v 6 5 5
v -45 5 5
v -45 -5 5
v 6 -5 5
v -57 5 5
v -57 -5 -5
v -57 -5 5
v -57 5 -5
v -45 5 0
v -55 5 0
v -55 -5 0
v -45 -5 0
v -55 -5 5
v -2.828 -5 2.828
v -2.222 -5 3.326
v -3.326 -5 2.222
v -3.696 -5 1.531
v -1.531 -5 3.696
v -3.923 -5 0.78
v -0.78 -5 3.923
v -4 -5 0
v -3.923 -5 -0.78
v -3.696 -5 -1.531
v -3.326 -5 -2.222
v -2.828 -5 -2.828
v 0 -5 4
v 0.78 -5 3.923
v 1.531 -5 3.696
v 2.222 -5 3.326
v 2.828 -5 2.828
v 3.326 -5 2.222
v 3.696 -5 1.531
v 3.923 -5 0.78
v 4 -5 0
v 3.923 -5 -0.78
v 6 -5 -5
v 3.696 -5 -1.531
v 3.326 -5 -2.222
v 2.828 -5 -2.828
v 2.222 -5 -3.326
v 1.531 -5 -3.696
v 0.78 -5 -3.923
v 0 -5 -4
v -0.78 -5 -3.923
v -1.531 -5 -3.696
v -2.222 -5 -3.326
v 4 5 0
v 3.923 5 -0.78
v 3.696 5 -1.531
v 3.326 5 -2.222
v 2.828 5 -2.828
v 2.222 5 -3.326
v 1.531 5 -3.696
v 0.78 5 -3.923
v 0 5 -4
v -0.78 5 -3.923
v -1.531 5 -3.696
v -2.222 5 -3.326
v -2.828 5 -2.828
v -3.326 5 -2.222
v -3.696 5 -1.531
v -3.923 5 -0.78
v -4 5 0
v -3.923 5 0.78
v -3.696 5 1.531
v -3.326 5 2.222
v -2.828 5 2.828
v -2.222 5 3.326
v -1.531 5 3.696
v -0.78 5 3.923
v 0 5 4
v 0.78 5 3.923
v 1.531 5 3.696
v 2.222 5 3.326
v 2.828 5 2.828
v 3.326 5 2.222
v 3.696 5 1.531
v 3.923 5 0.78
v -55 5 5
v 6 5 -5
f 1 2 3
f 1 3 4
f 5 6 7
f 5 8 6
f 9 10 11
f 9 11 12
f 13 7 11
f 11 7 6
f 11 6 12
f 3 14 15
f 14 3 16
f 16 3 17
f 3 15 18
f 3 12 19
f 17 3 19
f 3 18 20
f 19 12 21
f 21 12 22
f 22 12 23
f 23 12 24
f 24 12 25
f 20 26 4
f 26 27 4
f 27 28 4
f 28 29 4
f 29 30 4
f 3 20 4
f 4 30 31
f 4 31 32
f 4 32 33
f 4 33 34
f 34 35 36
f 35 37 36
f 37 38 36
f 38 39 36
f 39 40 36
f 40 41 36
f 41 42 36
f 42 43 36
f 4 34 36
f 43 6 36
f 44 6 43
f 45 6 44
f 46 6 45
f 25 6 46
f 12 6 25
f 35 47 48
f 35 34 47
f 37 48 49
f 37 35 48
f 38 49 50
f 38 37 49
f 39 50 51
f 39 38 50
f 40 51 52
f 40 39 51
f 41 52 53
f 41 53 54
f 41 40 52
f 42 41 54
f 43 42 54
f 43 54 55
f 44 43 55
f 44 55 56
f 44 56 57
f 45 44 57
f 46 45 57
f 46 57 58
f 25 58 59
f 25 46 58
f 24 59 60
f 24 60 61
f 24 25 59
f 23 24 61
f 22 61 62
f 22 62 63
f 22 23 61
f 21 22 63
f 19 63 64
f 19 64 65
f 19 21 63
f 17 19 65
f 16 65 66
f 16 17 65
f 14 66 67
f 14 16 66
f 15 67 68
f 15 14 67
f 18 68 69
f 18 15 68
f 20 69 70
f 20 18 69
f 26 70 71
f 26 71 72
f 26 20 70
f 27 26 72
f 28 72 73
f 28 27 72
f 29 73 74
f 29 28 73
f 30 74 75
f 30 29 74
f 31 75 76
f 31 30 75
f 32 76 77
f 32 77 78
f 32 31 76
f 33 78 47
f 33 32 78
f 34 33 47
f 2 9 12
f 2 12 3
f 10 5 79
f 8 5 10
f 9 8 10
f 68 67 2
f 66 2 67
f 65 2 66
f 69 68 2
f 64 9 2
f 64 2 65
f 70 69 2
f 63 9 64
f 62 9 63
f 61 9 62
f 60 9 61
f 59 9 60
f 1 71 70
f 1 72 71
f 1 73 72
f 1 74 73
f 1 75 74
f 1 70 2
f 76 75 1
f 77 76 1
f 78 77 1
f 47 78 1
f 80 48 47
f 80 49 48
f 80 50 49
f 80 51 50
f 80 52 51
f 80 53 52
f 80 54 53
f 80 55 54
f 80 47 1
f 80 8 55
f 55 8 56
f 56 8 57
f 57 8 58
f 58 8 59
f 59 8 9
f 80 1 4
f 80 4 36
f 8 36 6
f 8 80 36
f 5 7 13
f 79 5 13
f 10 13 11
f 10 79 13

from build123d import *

# Parameters (mm, degrees)
SKETCH_1_R      = 4
EXTRUDE_1_DEPTH = 5


with BuildPart() as part:
    # 草圖1 → 填料-伸長1 (new body, symmetric)
    with BuildSketch(Plane(origin=(0, 0, 0), x_dir=(1, 0, 0), z_dir=(0, 1, 0))):
        Polygon((-55, -5), (-55, 0), (-45, 0), (-45, -5), (6, -5), (6, 5), (-57, 5), (-57, -5), align=None)
        Circle(SKETCH_1_R, mode=Mode.SUBTRACT)
    extrude(amount=EXTRUDE_1_DEPTH, both=True)


solid = part.part
